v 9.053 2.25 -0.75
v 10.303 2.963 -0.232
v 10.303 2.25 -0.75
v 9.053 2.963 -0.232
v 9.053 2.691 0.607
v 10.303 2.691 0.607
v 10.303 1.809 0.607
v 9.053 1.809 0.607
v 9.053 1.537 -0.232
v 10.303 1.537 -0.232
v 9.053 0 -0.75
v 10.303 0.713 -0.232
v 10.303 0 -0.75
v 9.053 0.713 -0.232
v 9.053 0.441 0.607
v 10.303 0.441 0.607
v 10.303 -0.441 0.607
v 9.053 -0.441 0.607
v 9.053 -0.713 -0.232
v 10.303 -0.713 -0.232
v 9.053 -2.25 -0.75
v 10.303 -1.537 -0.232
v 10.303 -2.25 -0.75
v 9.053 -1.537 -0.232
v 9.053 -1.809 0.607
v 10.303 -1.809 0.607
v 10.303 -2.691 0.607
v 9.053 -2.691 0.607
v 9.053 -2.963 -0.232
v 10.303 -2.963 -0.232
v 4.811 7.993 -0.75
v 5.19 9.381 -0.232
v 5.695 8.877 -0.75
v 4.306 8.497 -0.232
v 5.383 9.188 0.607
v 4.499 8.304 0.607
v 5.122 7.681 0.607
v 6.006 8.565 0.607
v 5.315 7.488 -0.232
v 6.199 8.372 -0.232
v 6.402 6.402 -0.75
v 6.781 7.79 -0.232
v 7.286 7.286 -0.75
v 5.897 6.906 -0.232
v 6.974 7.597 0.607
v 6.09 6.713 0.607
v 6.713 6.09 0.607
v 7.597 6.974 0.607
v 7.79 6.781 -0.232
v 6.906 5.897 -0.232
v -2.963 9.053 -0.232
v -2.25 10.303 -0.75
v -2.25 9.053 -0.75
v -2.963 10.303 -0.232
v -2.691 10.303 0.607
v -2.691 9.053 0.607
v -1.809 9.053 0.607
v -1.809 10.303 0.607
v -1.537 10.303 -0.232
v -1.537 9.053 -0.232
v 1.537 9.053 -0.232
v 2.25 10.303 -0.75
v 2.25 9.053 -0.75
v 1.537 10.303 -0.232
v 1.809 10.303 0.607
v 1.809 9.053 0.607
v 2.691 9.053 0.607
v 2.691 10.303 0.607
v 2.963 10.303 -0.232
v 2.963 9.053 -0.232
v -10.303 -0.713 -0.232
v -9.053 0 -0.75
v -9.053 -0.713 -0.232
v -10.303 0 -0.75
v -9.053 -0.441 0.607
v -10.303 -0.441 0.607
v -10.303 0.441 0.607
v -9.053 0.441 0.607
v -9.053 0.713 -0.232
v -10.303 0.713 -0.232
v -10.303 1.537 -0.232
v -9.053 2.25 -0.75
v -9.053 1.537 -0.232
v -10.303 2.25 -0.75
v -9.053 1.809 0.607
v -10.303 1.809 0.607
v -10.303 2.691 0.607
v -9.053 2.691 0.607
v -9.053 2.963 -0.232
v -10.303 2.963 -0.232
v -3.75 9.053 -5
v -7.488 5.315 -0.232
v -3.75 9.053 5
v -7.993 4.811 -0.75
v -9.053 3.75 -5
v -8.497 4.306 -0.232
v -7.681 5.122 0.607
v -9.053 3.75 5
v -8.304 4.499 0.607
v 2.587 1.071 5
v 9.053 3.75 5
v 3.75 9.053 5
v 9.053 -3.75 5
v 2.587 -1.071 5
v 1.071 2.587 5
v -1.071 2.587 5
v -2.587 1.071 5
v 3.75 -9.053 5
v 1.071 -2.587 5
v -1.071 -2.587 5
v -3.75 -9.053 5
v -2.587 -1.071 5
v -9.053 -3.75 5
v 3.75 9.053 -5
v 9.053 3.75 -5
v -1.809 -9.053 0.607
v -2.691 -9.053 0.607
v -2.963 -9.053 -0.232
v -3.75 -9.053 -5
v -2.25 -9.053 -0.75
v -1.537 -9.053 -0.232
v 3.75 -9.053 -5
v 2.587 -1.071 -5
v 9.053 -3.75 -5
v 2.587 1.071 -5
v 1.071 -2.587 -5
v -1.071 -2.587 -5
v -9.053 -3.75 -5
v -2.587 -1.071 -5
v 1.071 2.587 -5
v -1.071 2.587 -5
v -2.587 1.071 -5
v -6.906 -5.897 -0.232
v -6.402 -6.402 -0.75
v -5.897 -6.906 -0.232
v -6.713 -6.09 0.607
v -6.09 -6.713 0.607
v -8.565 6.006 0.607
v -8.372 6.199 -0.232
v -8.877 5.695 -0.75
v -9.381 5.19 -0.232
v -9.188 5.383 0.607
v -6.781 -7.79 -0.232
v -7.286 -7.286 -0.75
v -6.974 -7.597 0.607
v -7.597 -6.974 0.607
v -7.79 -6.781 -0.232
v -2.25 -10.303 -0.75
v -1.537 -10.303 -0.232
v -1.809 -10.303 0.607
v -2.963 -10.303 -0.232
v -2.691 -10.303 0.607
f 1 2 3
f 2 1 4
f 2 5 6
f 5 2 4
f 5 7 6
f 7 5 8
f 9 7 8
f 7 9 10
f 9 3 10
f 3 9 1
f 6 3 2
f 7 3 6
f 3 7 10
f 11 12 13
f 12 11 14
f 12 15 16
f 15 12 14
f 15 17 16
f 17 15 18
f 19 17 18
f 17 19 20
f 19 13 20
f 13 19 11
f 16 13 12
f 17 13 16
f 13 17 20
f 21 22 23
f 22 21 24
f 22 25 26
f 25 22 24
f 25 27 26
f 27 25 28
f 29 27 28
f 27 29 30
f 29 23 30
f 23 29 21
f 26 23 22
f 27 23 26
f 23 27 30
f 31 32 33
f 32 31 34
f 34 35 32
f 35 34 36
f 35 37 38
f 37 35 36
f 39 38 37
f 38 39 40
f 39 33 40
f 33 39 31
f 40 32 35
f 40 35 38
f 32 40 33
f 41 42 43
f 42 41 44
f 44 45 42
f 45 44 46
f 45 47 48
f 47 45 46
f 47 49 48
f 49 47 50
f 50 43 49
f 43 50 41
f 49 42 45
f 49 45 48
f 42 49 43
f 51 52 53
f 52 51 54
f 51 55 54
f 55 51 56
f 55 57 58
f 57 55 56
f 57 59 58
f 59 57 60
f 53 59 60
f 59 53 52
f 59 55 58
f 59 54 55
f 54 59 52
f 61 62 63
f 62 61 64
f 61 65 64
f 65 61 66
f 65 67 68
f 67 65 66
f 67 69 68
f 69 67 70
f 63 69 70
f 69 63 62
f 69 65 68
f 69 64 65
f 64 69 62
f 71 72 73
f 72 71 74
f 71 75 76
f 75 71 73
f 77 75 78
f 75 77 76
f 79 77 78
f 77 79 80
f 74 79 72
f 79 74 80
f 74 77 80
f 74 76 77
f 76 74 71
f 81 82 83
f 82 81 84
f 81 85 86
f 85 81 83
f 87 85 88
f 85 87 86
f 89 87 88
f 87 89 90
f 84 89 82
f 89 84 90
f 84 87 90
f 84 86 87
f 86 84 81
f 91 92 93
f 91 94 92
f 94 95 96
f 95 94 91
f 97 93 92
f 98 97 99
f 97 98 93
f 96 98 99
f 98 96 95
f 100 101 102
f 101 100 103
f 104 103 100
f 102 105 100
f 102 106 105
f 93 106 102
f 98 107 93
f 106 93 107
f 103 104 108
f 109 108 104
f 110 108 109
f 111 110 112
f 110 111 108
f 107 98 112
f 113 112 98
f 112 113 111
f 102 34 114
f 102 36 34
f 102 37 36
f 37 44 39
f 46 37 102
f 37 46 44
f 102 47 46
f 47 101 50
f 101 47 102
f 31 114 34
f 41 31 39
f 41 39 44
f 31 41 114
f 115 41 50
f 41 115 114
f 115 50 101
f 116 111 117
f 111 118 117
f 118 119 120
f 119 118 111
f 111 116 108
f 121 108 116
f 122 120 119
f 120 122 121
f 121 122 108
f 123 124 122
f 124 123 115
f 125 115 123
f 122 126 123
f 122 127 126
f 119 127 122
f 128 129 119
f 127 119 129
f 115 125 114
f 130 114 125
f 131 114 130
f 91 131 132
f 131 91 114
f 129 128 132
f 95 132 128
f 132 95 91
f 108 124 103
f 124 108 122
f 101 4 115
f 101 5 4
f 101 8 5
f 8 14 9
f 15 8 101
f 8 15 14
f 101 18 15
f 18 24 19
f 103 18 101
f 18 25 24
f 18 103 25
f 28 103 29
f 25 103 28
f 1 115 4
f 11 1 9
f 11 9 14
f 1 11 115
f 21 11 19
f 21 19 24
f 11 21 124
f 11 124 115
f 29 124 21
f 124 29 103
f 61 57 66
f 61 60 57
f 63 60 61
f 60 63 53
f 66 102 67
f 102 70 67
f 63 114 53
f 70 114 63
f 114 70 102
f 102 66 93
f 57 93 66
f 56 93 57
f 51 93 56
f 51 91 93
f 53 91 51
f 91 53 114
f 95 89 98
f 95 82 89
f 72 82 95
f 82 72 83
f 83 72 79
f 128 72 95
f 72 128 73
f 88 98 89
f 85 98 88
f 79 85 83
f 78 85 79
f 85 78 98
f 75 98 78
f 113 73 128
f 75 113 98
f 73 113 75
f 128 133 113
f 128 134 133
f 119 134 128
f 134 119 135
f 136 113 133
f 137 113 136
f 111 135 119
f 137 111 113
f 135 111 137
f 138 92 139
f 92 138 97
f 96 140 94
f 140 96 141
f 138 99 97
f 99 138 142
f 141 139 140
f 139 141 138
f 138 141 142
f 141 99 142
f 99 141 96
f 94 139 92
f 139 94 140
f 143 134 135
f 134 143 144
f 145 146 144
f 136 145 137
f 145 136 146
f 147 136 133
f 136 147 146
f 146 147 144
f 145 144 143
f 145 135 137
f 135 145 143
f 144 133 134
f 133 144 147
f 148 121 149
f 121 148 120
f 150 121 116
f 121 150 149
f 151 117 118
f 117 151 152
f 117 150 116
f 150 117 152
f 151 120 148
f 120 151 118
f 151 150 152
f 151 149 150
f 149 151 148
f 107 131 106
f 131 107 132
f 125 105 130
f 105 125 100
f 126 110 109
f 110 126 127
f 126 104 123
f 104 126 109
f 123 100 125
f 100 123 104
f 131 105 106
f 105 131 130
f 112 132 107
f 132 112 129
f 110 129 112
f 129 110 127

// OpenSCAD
// Braille Wheel Copyright (c) Anav Mehta
z=5;
s=7.5;
scales=s/2;
pinr=s/10;
pinh=s/3;
pinoff=pinr*3;
smalls=s/3.5;
scalesmalls=smalls/2;

module pins(s0=true,s1=true,s2=true) {
  union() {
    if (s0==true) translate([0,pinoff,0]) rotate([0,90,0]) cylinder(r=pinr,h=pinh,center=true);
    if (s1==true) translate([0,0,0]) rotate([0,90,0])cylinder(r=pinr,h=pinh,center=true);
    if (s2==true) translate([0.0,-pinoff,0]) rotate([0,90,0])cylinder(r=pinr,h=pinh,center=true);
  }
}
module octagonwithpins() {
    union(){
        polyhedron(points=[
  [ (1+sqrt(2))*scales,   1*scales, z],  //0
  [  1*scales,  (1+sqrt(2))*scales, z],  //1
  [ -1*scales,  (1+sqrt(2))*scales, z],  //2
  [-(1+sqrt(2))*scales,   1*scales, z],  //3
  [-(1+sqrt(2))*scales,  -1*scales, z],  //4
  [ -1*scales, -(1+sqrt(2))*scales, z],  //5
  [  1*scales, -(1+sqrt(2))*scales, z],  //6
  [ (1+sqrt(2))*scales,  -1*scales, z],  //7
  [ (1+sqrt(2))*scales,   1*scales, -z],  //8
  [  1*scales,  (1+sqrt(2))*scales, -z],  //9
  [ -1*scales,  (1+sqrt(2))*scales, -z],  //10
  [-(1+sqrt(2))*scales,   1*scales, -z],  //11
  [-(1+sqrt(2))*scales,  -1*scales, -z],  //12
  [ -1*scales, -(1+sqrt(2))*scales, -z],  //13
  [  1*scales, -(1+sqrt(2))*scales, -z],  //14
  [ (1+sqrt(2))*scales,  -1*scales, -z],  //15
  ],
  faces=[
  [7,6,5,4,3,2,1,0],
  [8,9,10,11,12,13,14,15],
  [0,1,9,8],
  [1,2,10,9],
  [2,3,11,10],
  [3,4,12,11],
  [4,5,13,12],
  [5,6,14,13],
  [6,7,15,14],
  [7,0,8,15],
  ]
  );
  translate([(1+sqrt(2))*scales,0,0]) pins(s0=true,s1=true,s2=true);
  rotate(a=45,v=[0,0,1]) translate([(1+sqrt(2))*scales,0,0])pins(s0=true,s1=true,s2=false);
 rotate(a=90,v=[0,0,1]) translate([(1+sqrt(2))*scales,0,0])pins(s0=true,s1=false,s2=true);
  rotate(a=135,v=[0,0,1]) translate([(1+sqrt(2))*scales,0,0])pins(s0=true,s1=false,s2=false);
   rotate(a=180,v=[0,0,1]) translate([(1+sqrt(2))*scales,0,0])pins(s0=false,s1=true,s2=true);
    rotate(a=225,v=[0,0,1]) translate([(1+sqrt(2))*scales,0,0])pins(s0=false,s1=true,s2=false);
  rotate(a=270,v=[0,0,1]) translate([(1+sqrt(2))*scales,0,0])pins(s0=false,s1=false,s2=true);
   rotate(a=315,v=[0,0,1]) translate([(1+sqrt(2))*scales,0,0])pins(s0=false,s1=false,s2=false);
    }
}


 difference() {
     octagonwithpins();
     
polyhedron(points=[
  [ (1+sqrt(2))*scalesmalls,   scalesmalls, z],  //0
  [  scalesmalls,  (1+sqrt(2))*scalesmalls, z],  //1
  [ -scalesmalls,  (1+sqrt(2))*scalesmalls, z],  //2
  [-(1+sqrt(2))*scalesmalls,   scalesmalls, z],  //3
  [-(1+sqrt(2))*scalesmalls,  -scalesmalls, z],  //4
  [ -scalesmalls, -(1+sqrt(2))*scalesmalls, z],  //5
  [  scalesmalls, -(1+sqrt(2))*scalesmalls, z],  //6
  [ (1+sqrt(2))*scalesmalls,  -scalesmalls, z],  //7
  [ (1+sqrt(2))*scalesmalls,   scalesmalls, -z],  //8
  [  scalesmalls,  (1+sqrt(2))*scalesmalls, -z],  //9
  [ -scalesmalls,  (1+sqrt(2))*scalesmalls, -z],  //10
  [-(1+sqrt(2))*scalesmalls,   scalesmalls, -z],  //11
  [-(1+sqrt(2))*scalesmalls,  -scalesmalls, -z],  //12
  [ -scalesmalls, -(1+sqrt(2))*scalesmalls, -z],  //13
  [  scalesmalls, -(1+sqrt(2))*scalesmalls, -z],  //14
  [ (1+sqrt(2))*scalesmalls,  -scalesmalls, -z],  //15
  ],
  faces=[
  [7,6,5,4,3,2,1,0],
  [8,9,10,11,12,13,14,15],
  [0,1,9,8],
  [1,2,10,9],
  [2,3,11,10],
  [3,4,12,11],
  [4,5,13,12],
  [5,6,14,13],
  [6,7,15,14],
  [7,0,8,15]
  ]
  );
}



echo(version=version());
